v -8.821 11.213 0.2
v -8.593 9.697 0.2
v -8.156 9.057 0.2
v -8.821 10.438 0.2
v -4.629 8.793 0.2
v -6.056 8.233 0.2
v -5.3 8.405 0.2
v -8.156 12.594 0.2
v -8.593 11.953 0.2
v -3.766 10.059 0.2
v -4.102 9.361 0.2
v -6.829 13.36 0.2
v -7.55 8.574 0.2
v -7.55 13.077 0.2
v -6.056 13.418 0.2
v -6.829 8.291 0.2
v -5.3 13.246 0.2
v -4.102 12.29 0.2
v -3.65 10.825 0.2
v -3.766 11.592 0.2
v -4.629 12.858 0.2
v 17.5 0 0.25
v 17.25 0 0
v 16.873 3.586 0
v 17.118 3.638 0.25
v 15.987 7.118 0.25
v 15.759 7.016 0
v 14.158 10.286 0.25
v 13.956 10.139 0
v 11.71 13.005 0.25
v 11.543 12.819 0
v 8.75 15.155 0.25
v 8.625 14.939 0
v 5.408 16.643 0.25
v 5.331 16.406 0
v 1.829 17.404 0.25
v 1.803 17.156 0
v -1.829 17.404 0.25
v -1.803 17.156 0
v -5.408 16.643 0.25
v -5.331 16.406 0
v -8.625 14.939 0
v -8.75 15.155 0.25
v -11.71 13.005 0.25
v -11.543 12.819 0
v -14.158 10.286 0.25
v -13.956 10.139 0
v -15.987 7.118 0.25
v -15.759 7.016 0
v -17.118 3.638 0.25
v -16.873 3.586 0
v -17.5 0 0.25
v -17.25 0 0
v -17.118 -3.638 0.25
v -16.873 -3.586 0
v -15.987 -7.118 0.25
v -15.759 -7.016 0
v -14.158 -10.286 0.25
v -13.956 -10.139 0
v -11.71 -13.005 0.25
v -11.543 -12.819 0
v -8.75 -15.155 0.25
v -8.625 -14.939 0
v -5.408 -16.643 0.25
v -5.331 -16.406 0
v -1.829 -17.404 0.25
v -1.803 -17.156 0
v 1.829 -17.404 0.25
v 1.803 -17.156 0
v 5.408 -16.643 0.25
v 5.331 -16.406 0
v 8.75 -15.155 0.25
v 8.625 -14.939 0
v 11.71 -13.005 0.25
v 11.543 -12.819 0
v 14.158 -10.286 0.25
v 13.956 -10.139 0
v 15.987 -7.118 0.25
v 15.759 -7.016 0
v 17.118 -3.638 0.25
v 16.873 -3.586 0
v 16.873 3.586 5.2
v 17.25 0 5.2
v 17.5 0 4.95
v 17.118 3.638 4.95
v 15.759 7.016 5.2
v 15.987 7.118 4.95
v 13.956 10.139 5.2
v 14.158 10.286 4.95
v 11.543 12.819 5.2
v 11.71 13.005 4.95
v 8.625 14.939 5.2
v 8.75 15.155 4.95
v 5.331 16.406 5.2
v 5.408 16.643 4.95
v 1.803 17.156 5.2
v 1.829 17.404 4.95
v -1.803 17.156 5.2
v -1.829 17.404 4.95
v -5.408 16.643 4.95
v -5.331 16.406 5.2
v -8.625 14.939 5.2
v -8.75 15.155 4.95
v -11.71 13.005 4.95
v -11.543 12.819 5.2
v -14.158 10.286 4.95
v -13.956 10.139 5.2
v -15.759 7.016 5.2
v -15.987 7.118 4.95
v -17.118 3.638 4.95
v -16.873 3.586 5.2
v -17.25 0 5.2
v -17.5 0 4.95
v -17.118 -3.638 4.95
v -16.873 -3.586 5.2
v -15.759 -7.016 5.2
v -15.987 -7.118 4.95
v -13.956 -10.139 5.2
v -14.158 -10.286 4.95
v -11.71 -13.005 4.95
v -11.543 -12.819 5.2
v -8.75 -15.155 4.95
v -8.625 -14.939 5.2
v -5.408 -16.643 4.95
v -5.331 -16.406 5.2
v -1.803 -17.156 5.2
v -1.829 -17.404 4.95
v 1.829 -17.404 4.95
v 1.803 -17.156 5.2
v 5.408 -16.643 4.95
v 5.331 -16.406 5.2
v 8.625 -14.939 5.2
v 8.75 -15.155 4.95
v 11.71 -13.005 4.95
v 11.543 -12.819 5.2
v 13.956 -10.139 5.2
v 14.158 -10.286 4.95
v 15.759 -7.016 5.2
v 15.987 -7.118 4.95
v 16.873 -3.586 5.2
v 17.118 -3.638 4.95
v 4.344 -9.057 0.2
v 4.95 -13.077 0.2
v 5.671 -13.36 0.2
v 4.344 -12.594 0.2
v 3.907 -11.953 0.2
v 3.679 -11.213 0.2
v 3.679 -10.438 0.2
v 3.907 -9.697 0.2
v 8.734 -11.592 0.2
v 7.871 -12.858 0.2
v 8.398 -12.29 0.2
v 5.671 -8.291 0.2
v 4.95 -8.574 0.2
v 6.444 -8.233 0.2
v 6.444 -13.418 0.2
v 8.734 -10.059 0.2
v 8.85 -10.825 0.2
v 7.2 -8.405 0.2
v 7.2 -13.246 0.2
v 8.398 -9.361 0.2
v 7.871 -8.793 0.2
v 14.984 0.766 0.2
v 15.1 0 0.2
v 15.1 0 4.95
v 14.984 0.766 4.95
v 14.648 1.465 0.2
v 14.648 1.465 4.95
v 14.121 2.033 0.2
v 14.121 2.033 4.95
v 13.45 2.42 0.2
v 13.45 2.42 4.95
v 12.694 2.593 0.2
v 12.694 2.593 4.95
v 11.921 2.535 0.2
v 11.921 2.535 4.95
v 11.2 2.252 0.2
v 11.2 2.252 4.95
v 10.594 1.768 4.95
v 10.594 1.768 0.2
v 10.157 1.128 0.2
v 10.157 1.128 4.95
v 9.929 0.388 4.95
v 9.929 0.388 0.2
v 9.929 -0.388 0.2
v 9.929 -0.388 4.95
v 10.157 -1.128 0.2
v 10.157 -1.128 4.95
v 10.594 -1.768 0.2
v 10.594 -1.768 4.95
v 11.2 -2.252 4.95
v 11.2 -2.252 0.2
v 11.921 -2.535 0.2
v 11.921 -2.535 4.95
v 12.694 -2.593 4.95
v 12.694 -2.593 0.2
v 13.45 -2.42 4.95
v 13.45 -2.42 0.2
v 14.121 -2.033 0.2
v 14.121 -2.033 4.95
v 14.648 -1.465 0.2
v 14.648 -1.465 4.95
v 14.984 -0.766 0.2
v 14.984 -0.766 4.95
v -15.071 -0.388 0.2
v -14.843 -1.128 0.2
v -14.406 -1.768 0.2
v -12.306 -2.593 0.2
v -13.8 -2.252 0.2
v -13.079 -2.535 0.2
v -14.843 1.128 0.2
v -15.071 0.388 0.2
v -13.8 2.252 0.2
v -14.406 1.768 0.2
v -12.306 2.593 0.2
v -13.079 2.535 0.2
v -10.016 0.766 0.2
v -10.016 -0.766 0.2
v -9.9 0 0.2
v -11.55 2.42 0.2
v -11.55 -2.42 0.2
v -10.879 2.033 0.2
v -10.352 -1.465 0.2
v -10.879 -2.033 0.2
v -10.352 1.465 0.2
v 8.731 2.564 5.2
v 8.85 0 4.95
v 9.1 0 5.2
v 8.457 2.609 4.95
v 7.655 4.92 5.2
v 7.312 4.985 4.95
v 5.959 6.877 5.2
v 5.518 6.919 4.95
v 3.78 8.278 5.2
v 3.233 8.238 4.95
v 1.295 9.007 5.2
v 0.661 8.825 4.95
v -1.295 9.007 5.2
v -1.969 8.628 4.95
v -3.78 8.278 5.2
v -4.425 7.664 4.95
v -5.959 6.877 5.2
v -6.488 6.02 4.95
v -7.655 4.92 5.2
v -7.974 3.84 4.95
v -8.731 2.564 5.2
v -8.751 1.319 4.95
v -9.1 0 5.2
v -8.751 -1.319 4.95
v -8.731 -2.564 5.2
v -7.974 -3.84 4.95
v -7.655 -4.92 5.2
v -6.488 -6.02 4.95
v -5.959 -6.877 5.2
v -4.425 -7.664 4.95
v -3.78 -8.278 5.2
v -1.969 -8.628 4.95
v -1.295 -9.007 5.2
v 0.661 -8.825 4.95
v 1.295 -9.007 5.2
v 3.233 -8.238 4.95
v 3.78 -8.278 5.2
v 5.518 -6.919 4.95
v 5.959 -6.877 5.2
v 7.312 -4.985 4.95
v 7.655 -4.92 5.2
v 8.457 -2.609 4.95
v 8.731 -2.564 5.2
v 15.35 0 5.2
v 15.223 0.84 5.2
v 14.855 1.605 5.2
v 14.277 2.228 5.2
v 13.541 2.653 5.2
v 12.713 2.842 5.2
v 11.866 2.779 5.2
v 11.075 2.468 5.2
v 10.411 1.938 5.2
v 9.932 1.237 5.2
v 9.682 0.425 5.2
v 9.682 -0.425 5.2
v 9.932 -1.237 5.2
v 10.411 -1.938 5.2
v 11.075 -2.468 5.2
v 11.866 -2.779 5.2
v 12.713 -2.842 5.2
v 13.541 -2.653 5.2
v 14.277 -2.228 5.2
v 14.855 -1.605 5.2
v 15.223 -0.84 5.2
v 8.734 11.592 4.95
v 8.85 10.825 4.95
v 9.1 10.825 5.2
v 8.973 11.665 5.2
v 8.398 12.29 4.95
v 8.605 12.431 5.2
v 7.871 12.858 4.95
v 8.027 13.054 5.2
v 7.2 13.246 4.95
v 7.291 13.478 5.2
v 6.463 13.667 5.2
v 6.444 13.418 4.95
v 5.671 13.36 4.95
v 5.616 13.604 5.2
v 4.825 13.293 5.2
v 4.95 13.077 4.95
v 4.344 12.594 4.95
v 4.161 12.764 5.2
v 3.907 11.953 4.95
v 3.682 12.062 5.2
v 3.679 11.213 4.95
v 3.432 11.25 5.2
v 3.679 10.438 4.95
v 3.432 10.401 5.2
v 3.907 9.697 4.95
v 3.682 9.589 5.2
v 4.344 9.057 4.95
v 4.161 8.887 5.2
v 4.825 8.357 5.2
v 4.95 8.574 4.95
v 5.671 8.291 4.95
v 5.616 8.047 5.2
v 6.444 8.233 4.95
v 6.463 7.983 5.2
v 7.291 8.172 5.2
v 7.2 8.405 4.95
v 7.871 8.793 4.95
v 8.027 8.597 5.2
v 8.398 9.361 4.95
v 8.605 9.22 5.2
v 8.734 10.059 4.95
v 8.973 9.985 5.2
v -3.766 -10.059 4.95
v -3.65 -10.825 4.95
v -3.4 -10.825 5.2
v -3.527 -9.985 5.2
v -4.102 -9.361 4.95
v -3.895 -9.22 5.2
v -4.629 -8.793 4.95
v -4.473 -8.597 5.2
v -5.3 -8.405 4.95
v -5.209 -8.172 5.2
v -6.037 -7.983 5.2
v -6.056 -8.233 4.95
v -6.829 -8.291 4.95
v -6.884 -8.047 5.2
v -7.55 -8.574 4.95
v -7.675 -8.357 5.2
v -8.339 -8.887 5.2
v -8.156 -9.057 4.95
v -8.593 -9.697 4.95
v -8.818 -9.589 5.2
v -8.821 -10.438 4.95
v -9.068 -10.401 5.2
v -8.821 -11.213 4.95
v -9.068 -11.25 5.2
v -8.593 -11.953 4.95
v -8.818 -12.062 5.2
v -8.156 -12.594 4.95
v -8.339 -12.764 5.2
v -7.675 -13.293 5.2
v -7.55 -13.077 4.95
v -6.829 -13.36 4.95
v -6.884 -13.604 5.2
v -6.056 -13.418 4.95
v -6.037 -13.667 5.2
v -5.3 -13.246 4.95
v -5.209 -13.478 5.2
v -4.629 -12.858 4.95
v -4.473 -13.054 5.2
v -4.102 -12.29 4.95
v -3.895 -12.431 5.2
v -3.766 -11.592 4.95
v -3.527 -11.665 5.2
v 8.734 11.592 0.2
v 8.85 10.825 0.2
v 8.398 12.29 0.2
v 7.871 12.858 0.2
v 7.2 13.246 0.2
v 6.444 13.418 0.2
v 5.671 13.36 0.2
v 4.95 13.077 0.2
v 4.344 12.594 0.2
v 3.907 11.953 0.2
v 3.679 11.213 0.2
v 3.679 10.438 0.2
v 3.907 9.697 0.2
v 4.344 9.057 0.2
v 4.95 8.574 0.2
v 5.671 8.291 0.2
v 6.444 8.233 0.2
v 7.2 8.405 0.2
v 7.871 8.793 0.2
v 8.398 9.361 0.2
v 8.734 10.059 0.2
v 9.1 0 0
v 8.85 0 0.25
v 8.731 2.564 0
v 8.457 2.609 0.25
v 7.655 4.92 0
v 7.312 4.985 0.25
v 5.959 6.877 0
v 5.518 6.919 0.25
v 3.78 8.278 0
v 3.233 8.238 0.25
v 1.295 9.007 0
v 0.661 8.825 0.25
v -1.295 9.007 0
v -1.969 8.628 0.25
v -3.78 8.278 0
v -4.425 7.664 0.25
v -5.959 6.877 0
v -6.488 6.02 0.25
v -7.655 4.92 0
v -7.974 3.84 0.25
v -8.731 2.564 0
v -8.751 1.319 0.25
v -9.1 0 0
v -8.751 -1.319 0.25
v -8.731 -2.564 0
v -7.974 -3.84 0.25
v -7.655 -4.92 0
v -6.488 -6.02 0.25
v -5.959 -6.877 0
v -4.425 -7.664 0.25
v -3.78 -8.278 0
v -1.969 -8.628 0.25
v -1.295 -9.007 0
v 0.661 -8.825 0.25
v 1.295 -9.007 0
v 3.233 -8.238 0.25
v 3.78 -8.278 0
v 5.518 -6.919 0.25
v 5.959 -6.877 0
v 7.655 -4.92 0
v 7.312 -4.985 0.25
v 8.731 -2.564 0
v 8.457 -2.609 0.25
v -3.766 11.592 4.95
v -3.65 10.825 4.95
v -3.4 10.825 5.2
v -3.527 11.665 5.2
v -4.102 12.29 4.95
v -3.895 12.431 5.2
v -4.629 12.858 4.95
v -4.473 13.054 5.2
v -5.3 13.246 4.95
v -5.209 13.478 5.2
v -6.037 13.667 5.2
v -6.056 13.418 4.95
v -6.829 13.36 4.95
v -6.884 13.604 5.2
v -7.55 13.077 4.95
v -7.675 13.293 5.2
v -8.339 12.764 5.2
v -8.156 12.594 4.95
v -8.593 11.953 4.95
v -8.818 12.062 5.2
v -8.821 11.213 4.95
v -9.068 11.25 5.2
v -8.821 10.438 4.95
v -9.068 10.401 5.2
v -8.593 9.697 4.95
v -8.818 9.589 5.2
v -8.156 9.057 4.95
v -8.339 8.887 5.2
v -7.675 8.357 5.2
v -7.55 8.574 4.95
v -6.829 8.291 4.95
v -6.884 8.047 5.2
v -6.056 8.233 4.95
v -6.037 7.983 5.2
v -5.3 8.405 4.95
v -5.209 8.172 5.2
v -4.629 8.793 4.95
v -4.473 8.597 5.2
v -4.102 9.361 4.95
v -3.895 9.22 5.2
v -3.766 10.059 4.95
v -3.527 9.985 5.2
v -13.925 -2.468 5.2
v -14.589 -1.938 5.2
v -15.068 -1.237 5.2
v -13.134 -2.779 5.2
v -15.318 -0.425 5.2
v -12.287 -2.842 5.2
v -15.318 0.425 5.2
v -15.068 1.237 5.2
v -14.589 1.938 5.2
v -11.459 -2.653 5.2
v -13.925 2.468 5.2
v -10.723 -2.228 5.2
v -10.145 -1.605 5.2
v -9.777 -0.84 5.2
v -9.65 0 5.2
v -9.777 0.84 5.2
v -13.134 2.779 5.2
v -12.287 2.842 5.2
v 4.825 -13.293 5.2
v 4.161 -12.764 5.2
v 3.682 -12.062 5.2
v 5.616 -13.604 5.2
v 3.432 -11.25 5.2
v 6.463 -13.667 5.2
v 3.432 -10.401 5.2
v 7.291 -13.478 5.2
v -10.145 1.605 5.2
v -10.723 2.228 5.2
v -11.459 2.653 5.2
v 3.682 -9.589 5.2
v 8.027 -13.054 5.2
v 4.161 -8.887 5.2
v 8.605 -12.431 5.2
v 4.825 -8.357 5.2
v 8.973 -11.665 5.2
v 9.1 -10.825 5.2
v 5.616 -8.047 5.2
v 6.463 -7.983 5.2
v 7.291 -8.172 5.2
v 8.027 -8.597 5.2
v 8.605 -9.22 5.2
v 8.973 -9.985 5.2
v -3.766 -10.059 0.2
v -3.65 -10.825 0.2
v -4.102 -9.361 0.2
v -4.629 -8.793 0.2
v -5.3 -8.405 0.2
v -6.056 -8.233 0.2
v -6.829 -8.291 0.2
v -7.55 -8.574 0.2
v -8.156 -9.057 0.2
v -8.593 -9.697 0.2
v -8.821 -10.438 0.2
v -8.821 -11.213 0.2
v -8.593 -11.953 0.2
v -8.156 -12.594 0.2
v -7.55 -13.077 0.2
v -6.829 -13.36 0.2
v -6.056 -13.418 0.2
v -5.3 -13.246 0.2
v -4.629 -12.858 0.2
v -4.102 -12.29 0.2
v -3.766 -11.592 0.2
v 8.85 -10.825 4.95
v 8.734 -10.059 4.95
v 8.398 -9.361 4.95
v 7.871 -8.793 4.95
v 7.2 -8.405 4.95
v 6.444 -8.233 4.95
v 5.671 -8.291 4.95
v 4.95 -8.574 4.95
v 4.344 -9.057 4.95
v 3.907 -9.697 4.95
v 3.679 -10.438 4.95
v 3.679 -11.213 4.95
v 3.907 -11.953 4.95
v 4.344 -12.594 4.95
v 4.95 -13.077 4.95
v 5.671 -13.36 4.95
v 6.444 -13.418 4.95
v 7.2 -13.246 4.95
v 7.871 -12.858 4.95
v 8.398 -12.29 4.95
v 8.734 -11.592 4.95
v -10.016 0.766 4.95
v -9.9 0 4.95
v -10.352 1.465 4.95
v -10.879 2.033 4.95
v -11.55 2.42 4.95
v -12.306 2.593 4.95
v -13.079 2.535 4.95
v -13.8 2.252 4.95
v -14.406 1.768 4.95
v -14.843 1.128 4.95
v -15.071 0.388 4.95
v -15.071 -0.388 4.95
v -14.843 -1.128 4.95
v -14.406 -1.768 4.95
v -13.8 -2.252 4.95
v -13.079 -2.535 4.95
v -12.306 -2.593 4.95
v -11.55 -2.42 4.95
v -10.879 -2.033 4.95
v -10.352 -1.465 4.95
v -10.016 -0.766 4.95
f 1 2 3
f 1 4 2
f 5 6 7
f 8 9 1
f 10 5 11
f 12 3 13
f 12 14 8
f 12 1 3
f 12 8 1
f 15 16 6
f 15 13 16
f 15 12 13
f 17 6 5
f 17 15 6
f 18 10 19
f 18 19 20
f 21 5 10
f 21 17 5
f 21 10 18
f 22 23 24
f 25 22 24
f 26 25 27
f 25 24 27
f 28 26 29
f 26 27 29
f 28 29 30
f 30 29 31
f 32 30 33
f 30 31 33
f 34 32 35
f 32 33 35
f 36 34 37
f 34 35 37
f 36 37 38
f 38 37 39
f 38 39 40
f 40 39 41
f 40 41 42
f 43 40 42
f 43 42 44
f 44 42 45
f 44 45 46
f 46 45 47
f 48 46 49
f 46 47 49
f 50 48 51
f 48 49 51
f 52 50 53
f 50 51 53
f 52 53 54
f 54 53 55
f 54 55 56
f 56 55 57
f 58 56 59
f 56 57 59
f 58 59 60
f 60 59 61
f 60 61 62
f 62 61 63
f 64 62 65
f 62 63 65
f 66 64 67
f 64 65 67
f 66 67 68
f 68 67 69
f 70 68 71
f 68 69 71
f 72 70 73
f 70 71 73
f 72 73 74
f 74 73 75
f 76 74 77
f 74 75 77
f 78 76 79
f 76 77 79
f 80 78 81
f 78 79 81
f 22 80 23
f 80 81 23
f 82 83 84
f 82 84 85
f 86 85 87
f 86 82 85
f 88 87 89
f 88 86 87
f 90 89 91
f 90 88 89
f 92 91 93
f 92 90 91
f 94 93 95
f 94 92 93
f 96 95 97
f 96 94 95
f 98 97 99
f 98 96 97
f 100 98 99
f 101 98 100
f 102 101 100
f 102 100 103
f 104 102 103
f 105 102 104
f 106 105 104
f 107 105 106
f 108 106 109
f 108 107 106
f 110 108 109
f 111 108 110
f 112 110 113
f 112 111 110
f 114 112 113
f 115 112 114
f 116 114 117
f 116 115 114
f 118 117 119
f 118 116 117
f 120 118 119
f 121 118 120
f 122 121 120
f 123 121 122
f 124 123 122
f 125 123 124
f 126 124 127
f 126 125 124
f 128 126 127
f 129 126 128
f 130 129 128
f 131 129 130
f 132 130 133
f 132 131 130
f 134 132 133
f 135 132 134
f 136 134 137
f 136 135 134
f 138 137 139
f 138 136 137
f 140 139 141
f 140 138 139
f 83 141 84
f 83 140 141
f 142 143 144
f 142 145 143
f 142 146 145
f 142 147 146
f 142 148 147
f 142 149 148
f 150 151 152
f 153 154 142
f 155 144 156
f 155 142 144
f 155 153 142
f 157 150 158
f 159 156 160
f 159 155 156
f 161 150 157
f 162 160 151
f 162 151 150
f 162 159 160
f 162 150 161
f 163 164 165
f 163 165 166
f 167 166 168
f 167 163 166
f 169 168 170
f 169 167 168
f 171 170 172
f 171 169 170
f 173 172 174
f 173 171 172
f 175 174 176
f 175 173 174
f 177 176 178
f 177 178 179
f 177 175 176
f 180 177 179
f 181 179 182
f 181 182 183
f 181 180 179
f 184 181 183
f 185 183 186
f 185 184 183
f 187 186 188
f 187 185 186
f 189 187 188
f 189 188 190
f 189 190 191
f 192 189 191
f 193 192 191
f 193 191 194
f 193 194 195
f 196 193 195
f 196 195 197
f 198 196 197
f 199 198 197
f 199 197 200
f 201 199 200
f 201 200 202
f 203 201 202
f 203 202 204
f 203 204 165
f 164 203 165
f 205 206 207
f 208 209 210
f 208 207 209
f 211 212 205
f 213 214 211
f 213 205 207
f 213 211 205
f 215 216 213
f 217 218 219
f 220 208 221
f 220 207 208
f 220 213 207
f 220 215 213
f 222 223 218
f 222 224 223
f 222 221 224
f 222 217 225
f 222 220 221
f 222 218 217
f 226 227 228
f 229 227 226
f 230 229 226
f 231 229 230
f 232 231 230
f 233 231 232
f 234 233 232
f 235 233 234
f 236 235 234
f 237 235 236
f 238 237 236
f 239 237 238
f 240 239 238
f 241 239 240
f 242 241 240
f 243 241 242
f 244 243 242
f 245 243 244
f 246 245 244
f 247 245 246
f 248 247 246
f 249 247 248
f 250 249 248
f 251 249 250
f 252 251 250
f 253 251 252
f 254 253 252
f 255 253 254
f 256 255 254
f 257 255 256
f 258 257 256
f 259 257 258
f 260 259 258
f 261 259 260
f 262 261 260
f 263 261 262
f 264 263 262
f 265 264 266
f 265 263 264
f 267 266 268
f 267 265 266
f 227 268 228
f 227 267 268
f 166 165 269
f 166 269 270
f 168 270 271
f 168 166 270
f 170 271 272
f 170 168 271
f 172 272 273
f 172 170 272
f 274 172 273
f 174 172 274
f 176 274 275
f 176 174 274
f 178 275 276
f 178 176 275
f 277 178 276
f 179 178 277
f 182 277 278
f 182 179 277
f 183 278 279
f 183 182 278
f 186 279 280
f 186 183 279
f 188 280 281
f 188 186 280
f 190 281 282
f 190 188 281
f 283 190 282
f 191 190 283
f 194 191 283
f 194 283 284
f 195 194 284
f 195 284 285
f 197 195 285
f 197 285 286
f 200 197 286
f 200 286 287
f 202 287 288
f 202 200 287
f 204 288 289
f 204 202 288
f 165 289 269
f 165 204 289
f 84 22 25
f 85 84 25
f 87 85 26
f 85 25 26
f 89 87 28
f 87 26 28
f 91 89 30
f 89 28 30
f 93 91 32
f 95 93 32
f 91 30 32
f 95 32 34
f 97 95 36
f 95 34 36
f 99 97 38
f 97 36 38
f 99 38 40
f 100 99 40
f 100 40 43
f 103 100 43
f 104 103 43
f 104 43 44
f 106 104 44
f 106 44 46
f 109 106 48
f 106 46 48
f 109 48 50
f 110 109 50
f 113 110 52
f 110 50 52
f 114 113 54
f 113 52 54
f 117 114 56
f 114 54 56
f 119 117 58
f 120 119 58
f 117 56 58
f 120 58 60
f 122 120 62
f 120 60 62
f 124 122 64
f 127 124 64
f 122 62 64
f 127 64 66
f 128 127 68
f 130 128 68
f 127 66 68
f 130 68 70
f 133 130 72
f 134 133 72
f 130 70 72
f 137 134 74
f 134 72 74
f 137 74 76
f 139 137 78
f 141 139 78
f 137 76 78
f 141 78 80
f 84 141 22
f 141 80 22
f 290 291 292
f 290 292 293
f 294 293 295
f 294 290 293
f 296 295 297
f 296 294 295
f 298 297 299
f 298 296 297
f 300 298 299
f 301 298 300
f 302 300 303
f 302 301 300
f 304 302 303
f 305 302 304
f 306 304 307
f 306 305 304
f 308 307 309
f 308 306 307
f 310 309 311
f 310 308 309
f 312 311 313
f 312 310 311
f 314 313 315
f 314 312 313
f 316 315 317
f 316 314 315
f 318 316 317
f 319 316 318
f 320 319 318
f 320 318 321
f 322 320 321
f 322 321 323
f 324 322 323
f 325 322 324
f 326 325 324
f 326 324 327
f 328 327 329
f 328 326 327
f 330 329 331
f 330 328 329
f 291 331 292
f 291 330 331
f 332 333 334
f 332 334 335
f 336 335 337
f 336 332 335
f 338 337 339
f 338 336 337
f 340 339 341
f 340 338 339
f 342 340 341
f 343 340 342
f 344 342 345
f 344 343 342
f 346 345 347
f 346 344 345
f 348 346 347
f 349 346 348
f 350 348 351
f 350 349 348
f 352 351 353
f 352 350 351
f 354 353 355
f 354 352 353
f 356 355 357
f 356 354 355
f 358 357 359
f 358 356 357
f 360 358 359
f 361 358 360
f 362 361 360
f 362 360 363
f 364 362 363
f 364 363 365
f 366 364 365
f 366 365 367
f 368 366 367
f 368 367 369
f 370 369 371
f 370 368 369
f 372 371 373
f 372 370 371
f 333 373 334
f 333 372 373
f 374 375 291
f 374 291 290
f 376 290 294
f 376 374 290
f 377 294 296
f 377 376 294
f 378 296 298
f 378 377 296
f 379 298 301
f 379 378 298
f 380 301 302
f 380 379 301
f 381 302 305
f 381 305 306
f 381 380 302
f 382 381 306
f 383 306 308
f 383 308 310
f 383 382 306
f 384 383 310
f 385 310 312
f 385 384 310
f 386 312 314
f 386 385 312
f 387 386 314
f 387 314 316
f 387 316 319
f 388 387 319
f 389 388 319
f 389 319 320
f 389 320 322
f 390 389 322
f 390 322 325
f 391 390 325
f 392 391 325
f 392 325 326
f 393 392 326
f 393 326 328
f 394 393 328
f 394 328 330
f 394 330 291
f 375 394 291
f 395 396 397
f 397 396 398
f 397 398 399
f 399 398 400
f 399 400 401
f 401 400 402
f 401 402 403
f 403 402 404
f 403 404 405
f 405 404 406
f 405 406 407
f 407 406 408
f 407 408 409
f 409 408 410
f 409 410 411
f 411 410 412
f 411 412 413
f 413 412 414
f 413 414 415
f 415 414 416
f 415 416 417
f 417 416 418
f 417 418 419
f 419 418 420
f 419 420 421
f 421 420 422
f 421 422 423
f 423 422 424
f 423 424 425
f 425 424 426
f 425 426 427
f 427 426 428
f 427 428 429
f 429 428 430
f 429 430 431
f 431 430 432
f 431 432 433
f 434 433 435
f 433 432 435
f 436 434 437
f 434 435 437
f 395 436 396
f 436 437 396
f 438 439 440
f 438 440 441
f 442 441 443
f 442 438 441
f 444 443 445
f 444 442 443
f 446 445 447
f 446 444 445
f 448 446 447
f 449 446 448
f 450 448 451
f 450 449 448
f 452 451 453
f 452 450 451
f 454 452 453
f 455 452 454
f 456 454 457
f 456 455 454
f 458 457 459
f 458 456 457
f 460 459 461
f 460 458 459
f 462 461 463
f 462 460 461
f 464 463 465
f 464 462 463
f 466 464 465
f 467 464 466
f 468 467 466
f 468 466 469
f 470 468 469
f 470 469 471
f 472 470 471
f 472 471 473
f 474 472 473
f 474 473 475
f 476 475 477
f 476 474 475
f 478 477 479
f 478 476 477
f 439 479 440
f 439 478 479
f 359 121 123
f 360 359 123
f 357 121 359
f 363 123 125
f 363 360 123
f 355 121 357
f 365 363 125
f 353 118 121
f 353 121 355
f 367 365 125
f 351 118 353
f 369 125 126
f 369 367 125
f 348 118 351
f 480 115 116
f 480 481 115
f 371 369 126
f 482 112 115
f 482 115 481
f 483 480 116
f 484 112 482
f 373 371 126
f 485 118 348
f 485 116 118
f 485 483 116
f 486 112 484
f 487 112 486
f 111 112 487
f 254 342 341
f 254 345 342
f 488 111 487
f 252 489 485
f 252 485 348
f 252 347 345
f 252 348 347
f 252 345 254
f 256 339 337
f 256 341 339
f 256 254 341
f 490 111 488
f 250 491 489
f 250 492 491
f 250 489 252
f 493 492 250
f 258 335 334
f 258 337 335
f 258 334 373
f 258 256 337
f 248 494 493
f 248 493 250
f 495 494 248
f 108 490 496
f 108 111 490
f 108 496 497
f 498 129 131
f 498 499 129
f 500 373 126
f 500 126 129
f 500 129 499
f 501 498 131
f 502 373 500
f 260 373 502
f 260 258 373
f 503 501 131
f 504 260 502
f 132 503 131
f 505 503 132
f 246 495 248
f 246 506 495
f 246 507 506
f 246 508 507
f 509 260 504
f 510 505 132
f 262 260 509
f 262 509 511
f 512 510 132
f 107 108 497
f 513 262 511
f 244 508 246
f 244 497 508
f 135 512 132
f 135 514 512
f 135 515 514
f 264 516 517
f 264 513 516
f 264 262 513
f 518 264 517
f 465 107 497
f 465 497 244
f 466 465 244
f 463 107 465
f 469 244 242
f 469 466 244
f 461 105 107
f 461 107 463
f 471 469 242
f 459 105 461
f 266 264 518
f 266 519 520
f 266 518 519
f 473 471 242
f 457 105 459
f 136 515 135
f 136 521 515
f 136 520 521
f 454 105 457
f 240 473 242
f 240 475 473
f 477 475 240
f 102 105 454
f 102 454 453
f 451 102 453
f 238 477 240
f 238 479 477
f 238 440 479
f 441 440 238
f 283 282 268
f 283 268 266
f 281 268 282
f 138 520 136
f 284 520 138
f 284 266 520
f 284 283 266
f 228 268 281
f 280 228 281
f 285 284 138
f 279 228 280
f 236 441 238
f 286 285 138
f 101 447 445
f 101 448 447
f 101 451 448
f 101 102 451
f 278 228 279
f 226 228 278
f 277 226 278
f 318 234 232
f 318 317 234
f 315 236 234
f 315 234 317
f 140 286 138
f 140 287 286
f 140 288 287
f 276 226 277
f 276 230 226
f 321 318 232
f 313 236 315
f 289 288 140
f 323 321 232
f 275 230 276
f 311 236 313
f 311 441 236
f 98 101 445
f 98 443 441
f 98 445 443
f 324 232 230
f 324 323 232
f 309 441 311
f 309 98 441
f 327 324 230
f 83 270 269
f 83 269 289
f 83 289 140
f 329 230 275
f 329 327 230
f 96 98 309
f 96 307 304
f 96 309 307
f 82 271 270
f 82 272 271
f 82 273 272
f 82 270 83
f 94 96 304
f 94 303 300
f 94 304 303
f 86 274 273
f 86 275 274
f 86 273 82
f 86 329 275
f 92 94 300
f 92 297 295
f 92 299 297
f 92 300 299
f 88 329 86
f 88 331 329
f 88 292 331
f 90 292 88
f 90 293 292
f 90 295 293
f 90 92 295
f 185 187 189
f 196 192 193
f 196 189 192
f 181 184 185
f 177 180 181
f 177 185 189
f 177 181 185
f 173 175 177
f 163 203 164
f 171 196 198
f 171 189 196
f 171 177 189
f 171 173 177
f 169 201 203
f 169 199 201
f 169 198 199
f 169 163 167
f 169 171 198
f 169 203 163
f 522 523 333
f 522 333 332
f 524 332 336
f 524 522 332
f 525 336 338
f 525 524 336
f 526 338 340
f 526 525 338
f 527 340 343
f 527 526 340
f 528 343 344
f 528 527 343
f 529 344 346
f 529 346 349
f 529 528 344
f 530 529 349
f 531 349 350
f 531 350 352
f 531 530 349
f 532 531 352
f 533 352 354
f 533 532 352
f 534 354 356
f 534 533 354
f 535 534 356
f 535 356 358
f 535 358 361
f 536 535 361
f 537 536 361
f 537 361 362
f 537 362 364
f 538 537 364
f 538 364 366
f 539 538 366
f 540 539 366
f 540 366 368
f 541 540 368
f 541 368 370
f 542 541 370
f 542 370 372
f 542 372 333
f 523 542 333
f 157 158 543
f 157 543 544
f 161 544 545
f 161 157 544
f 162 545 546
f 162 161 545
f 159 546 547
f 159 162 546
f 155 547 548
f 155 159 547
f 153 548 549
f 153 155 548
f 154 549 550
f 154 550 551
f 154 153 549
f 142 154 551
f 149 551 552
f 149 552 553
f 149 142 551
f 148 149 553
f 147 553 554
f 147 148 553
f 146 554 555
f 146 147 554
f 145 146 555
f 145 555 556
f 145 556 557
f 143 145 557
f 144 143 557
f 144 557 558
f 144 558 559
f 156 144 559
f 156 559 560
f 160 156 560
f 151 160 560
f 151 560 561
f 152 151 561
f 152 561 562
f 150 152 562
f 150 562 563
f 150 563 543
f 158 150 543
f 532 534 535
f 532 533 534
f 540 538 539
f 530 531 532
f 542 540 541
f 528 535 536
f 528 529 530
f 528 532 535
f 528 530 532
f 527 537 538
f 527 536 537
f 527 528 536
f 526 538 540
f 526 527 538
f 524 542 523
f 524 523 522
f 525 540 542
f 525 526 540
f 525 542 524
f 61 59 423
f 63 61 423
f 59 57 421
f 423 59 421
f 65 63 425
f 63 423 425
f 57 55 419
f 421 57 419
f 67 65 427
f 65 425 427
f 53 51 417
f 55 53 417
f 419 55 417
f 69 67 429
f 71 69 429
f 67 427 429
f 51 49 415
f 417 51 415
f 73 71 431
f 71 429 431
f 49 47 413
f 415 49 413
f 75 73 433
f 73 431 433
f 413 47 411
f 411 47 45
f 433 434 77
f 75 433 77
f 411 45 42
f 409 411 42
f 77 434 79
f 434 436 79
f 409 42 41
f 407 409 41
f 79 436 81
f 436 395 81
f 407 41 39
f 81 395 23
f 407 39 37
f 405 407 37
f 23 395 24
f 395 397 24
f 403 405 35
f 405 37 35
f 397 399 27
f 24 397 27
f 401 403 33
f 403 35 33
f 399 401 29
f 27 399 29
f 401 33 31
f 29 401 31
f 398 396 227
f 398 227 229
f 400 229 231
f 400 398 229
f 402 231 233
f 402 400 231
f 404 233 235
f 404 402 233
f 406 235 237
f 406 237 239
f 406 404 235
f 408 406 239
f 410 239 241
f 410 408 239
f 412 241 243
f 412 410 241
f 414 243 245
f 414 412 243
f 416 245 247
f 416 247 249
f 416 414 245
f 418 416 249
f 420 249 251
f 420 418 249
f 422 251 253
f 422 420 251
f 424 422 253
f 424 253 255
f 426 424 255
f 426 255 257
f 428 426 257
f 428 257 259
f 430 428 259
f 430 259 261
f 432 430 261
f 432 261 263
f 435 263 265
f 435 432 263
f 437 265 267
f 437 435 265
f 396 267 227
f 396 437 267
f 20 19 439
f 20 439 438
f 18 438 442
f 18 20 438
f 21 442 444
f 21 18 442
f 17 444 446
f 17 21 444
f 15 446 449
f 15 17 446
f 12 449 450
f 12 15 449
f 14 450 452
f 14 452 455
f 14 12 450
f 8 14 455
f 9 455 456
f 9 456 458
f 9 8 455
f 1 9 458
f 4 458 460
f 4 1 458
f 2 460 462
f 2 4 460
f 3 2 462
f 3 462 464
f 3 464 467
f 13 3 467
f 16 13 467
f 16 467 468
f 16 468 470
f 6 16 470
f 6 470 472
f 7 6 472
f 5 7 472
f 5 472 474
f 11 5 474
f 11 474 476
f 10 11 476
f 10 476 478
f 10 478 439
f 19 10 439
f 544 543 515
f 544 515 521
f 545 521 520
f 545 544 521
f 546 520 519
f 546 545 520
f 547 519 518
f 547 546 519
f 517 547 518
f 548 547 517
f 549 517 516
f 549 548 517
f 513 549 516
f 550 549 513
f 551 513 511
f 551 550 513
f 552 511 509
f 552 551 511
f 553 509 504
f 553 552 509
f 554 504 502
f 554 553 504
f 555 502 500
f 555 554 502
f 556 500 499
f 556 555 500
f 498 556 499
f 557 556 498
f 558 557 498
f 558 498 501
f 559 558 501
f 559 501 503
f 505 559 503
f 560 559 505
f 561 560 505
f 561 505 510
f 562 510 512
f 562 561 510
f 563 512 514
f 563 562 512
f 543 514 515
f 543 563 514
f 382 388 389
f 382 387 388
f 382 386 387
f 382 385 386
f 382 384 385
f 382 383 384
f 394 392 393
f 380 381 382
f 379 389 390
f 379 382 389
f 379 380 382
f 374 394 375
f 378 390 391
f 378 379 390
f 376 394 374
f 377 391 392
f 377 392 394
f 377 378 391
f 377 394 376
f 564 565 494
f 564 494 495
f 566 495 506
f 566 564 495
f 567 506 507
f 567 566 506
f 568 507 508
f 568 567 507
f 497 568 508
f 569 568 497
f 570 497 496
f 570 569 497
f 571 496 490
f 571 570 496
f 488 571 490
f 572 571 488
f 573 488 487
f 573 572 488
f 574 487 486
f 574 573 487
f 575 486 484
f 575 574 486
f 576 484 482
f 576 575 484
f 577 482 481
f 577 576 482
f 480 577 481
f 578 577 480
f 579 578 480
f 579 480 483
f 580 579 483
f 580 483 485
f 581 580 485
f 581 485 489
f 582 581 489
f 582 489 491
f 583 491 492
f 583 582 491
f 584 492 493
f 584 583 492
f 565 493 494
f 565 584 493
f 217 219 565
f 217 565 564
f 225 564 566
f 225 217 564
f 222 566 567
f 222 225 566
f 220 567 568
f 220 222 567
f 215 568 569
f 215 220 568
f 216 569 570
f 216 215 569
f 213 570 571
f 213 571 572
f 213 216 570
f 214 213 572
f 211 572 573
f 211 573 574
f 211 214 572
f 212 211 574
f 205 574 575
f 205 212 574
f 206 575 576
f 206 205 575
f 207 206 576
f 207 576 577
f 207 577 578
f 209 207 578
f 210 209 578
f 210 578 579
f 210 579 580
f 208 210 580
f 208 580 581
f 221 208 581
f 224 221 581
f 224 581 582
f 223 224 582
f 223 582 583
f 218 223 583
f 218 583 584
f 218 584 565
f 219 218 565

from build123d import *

# Parameters (mm, degrees)
SKETCH_R        = 17.5
SKETCH_R_2      = 8.85
SKETCH_R_3      = 2.6
PAD_DEPTH       = 5.2
SKETCH001_R     = 17.5
SKETCH001_R_2   = 8.85
PAD001_DEPTH    = 0.2
CHAMFER_SIZE    = 0.25
CHAMFER001_SIZE = 0.25


with BuildPart() as part:
    # Sketch → Pad (new body)
    with BuildSketch(Plane.XY):
        Circle(SKETCH_R)
        Circle(SKETCH_R_2, mode=Mode.SUBTRACT)
        with Locations((12.5, 0)):
            Circle(SKETCH_R_3, mode=Mode.SUBTRACT)
        with Locations((-12.5, 0)):
            Circle(SKETCH_R_3, mode=Mode.SUBTRACT)
        with Locations((-6.25, 10.825318)):
            Circle(SKETCH_R_3, mode=Mode.SUBTRACT)
        with Locations((6.25, 10.825318)):
            Circle(SKETCH_R_3, mode=Mode.SUBTRACT)
        with Locations((-6.25, -10.825318)):
            Circle(SKETCH_R_3, mode=Mode.SUBTRACT)
        with Locations((6.25, -10.825318)):
            Circle(SKETCH_R_3, mode=Mode.SUBTRACT)
    extrude(amount=PAD_DEPTH)

    # Sketch001 → Pad001 (join)
    with BuildSketch(Plane.XY):
        Circle(SKETCH001_R)
        Circle(SKETCH001_R_2, mode=Mode.SUBTRACT)
    extrude(amount=PAD001_DEPTH)

    # Chamfer
    chamfer_edges = [part.edges().sort_by_distance(p)[0] for p in [
        (-17.5, 0, 5.2),
        (-8.85, 0, 5.2),
        (3.65, -10.825318, 5.2),
        (-8.85, 10.825318, 5.2),
        (-15.1, 0, 5.2),
        (9.9, 0, 5.2),
        (-8.85, -10.825318, 5.2),
        (3.65, 10.825318, 5.2),
    ]]
    chamfer(chamfer_edges, length=CHAMFER_SIZE)

    # Chamfer001
    chamfer001_edges = [part.edges().sort_by_distance(p)[0] for p in [
        (-17.5, 0, 0),
        (-8.85, 0, 0),
    ]]
    chamfer(chamfer001_edges, length=CHAMFER001_SIZE)


solid = part.part
